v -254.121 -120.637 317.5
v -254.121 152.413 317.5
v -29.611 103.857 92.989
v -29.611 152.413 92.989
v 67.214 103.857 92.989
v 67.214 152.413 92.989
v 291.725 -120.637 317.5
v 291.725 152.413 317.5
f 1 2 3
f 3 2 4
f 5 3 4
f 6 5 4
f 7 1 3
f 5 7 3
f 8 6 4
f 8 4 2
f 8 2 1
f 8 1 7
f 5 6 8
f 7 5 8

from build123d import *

# Parameters (mm, degrees)
F0_W     = 545.846
F0_H     = 273.05
F1_DEPTH = 317.5
F4_DEPTH = 545.847
F5_DEPTH = 273.051


with BuildPart() as f1:
    # F0 (on Top) → F1 (new body)
    with BuildSketch(Plane.XY):
        with Locations((18.801767, 15.887847)):
            Rectangle(F0_W, F0_H)
    extrude(amount=F1_DEPTH)

    # F3 (on face) → F4 (cut, through all)
    with BuildSketch(Plane(origin=(-254.121233, 0, 0), x_dir=(0, -1, 0), z_dir=(-1, 0, 0))):
        Polygon((-103.856937, 92.9894), (-152.412847, 92.9894), (-152.412847, 0), (120.637153, 0), (120.637153, 317.5), align=None)
    extrude(amount=-F4_DEPTH, mode=Mode.SUBTRACT)

    # F2 (on face) → F5 (cut, through all)
    with BuildSketch(Plane(origin=(0, 152.412847, 0), x_dir=(-1, 0, 0), z_dir=(0, 1, 0))):
        Polygon((-63.378767, 0), (25.775233, 0), (254.121233, 0), (254.121233, 317.5), (29.610633, 92.9894), (-67.214167, 92.9894), (-291.724767, 317.5), (-291.724767, 0), align=None)
    extrude(amount=-F5_DEPTH, mode=Mode.SUBTRACT)


solid = f1.part
